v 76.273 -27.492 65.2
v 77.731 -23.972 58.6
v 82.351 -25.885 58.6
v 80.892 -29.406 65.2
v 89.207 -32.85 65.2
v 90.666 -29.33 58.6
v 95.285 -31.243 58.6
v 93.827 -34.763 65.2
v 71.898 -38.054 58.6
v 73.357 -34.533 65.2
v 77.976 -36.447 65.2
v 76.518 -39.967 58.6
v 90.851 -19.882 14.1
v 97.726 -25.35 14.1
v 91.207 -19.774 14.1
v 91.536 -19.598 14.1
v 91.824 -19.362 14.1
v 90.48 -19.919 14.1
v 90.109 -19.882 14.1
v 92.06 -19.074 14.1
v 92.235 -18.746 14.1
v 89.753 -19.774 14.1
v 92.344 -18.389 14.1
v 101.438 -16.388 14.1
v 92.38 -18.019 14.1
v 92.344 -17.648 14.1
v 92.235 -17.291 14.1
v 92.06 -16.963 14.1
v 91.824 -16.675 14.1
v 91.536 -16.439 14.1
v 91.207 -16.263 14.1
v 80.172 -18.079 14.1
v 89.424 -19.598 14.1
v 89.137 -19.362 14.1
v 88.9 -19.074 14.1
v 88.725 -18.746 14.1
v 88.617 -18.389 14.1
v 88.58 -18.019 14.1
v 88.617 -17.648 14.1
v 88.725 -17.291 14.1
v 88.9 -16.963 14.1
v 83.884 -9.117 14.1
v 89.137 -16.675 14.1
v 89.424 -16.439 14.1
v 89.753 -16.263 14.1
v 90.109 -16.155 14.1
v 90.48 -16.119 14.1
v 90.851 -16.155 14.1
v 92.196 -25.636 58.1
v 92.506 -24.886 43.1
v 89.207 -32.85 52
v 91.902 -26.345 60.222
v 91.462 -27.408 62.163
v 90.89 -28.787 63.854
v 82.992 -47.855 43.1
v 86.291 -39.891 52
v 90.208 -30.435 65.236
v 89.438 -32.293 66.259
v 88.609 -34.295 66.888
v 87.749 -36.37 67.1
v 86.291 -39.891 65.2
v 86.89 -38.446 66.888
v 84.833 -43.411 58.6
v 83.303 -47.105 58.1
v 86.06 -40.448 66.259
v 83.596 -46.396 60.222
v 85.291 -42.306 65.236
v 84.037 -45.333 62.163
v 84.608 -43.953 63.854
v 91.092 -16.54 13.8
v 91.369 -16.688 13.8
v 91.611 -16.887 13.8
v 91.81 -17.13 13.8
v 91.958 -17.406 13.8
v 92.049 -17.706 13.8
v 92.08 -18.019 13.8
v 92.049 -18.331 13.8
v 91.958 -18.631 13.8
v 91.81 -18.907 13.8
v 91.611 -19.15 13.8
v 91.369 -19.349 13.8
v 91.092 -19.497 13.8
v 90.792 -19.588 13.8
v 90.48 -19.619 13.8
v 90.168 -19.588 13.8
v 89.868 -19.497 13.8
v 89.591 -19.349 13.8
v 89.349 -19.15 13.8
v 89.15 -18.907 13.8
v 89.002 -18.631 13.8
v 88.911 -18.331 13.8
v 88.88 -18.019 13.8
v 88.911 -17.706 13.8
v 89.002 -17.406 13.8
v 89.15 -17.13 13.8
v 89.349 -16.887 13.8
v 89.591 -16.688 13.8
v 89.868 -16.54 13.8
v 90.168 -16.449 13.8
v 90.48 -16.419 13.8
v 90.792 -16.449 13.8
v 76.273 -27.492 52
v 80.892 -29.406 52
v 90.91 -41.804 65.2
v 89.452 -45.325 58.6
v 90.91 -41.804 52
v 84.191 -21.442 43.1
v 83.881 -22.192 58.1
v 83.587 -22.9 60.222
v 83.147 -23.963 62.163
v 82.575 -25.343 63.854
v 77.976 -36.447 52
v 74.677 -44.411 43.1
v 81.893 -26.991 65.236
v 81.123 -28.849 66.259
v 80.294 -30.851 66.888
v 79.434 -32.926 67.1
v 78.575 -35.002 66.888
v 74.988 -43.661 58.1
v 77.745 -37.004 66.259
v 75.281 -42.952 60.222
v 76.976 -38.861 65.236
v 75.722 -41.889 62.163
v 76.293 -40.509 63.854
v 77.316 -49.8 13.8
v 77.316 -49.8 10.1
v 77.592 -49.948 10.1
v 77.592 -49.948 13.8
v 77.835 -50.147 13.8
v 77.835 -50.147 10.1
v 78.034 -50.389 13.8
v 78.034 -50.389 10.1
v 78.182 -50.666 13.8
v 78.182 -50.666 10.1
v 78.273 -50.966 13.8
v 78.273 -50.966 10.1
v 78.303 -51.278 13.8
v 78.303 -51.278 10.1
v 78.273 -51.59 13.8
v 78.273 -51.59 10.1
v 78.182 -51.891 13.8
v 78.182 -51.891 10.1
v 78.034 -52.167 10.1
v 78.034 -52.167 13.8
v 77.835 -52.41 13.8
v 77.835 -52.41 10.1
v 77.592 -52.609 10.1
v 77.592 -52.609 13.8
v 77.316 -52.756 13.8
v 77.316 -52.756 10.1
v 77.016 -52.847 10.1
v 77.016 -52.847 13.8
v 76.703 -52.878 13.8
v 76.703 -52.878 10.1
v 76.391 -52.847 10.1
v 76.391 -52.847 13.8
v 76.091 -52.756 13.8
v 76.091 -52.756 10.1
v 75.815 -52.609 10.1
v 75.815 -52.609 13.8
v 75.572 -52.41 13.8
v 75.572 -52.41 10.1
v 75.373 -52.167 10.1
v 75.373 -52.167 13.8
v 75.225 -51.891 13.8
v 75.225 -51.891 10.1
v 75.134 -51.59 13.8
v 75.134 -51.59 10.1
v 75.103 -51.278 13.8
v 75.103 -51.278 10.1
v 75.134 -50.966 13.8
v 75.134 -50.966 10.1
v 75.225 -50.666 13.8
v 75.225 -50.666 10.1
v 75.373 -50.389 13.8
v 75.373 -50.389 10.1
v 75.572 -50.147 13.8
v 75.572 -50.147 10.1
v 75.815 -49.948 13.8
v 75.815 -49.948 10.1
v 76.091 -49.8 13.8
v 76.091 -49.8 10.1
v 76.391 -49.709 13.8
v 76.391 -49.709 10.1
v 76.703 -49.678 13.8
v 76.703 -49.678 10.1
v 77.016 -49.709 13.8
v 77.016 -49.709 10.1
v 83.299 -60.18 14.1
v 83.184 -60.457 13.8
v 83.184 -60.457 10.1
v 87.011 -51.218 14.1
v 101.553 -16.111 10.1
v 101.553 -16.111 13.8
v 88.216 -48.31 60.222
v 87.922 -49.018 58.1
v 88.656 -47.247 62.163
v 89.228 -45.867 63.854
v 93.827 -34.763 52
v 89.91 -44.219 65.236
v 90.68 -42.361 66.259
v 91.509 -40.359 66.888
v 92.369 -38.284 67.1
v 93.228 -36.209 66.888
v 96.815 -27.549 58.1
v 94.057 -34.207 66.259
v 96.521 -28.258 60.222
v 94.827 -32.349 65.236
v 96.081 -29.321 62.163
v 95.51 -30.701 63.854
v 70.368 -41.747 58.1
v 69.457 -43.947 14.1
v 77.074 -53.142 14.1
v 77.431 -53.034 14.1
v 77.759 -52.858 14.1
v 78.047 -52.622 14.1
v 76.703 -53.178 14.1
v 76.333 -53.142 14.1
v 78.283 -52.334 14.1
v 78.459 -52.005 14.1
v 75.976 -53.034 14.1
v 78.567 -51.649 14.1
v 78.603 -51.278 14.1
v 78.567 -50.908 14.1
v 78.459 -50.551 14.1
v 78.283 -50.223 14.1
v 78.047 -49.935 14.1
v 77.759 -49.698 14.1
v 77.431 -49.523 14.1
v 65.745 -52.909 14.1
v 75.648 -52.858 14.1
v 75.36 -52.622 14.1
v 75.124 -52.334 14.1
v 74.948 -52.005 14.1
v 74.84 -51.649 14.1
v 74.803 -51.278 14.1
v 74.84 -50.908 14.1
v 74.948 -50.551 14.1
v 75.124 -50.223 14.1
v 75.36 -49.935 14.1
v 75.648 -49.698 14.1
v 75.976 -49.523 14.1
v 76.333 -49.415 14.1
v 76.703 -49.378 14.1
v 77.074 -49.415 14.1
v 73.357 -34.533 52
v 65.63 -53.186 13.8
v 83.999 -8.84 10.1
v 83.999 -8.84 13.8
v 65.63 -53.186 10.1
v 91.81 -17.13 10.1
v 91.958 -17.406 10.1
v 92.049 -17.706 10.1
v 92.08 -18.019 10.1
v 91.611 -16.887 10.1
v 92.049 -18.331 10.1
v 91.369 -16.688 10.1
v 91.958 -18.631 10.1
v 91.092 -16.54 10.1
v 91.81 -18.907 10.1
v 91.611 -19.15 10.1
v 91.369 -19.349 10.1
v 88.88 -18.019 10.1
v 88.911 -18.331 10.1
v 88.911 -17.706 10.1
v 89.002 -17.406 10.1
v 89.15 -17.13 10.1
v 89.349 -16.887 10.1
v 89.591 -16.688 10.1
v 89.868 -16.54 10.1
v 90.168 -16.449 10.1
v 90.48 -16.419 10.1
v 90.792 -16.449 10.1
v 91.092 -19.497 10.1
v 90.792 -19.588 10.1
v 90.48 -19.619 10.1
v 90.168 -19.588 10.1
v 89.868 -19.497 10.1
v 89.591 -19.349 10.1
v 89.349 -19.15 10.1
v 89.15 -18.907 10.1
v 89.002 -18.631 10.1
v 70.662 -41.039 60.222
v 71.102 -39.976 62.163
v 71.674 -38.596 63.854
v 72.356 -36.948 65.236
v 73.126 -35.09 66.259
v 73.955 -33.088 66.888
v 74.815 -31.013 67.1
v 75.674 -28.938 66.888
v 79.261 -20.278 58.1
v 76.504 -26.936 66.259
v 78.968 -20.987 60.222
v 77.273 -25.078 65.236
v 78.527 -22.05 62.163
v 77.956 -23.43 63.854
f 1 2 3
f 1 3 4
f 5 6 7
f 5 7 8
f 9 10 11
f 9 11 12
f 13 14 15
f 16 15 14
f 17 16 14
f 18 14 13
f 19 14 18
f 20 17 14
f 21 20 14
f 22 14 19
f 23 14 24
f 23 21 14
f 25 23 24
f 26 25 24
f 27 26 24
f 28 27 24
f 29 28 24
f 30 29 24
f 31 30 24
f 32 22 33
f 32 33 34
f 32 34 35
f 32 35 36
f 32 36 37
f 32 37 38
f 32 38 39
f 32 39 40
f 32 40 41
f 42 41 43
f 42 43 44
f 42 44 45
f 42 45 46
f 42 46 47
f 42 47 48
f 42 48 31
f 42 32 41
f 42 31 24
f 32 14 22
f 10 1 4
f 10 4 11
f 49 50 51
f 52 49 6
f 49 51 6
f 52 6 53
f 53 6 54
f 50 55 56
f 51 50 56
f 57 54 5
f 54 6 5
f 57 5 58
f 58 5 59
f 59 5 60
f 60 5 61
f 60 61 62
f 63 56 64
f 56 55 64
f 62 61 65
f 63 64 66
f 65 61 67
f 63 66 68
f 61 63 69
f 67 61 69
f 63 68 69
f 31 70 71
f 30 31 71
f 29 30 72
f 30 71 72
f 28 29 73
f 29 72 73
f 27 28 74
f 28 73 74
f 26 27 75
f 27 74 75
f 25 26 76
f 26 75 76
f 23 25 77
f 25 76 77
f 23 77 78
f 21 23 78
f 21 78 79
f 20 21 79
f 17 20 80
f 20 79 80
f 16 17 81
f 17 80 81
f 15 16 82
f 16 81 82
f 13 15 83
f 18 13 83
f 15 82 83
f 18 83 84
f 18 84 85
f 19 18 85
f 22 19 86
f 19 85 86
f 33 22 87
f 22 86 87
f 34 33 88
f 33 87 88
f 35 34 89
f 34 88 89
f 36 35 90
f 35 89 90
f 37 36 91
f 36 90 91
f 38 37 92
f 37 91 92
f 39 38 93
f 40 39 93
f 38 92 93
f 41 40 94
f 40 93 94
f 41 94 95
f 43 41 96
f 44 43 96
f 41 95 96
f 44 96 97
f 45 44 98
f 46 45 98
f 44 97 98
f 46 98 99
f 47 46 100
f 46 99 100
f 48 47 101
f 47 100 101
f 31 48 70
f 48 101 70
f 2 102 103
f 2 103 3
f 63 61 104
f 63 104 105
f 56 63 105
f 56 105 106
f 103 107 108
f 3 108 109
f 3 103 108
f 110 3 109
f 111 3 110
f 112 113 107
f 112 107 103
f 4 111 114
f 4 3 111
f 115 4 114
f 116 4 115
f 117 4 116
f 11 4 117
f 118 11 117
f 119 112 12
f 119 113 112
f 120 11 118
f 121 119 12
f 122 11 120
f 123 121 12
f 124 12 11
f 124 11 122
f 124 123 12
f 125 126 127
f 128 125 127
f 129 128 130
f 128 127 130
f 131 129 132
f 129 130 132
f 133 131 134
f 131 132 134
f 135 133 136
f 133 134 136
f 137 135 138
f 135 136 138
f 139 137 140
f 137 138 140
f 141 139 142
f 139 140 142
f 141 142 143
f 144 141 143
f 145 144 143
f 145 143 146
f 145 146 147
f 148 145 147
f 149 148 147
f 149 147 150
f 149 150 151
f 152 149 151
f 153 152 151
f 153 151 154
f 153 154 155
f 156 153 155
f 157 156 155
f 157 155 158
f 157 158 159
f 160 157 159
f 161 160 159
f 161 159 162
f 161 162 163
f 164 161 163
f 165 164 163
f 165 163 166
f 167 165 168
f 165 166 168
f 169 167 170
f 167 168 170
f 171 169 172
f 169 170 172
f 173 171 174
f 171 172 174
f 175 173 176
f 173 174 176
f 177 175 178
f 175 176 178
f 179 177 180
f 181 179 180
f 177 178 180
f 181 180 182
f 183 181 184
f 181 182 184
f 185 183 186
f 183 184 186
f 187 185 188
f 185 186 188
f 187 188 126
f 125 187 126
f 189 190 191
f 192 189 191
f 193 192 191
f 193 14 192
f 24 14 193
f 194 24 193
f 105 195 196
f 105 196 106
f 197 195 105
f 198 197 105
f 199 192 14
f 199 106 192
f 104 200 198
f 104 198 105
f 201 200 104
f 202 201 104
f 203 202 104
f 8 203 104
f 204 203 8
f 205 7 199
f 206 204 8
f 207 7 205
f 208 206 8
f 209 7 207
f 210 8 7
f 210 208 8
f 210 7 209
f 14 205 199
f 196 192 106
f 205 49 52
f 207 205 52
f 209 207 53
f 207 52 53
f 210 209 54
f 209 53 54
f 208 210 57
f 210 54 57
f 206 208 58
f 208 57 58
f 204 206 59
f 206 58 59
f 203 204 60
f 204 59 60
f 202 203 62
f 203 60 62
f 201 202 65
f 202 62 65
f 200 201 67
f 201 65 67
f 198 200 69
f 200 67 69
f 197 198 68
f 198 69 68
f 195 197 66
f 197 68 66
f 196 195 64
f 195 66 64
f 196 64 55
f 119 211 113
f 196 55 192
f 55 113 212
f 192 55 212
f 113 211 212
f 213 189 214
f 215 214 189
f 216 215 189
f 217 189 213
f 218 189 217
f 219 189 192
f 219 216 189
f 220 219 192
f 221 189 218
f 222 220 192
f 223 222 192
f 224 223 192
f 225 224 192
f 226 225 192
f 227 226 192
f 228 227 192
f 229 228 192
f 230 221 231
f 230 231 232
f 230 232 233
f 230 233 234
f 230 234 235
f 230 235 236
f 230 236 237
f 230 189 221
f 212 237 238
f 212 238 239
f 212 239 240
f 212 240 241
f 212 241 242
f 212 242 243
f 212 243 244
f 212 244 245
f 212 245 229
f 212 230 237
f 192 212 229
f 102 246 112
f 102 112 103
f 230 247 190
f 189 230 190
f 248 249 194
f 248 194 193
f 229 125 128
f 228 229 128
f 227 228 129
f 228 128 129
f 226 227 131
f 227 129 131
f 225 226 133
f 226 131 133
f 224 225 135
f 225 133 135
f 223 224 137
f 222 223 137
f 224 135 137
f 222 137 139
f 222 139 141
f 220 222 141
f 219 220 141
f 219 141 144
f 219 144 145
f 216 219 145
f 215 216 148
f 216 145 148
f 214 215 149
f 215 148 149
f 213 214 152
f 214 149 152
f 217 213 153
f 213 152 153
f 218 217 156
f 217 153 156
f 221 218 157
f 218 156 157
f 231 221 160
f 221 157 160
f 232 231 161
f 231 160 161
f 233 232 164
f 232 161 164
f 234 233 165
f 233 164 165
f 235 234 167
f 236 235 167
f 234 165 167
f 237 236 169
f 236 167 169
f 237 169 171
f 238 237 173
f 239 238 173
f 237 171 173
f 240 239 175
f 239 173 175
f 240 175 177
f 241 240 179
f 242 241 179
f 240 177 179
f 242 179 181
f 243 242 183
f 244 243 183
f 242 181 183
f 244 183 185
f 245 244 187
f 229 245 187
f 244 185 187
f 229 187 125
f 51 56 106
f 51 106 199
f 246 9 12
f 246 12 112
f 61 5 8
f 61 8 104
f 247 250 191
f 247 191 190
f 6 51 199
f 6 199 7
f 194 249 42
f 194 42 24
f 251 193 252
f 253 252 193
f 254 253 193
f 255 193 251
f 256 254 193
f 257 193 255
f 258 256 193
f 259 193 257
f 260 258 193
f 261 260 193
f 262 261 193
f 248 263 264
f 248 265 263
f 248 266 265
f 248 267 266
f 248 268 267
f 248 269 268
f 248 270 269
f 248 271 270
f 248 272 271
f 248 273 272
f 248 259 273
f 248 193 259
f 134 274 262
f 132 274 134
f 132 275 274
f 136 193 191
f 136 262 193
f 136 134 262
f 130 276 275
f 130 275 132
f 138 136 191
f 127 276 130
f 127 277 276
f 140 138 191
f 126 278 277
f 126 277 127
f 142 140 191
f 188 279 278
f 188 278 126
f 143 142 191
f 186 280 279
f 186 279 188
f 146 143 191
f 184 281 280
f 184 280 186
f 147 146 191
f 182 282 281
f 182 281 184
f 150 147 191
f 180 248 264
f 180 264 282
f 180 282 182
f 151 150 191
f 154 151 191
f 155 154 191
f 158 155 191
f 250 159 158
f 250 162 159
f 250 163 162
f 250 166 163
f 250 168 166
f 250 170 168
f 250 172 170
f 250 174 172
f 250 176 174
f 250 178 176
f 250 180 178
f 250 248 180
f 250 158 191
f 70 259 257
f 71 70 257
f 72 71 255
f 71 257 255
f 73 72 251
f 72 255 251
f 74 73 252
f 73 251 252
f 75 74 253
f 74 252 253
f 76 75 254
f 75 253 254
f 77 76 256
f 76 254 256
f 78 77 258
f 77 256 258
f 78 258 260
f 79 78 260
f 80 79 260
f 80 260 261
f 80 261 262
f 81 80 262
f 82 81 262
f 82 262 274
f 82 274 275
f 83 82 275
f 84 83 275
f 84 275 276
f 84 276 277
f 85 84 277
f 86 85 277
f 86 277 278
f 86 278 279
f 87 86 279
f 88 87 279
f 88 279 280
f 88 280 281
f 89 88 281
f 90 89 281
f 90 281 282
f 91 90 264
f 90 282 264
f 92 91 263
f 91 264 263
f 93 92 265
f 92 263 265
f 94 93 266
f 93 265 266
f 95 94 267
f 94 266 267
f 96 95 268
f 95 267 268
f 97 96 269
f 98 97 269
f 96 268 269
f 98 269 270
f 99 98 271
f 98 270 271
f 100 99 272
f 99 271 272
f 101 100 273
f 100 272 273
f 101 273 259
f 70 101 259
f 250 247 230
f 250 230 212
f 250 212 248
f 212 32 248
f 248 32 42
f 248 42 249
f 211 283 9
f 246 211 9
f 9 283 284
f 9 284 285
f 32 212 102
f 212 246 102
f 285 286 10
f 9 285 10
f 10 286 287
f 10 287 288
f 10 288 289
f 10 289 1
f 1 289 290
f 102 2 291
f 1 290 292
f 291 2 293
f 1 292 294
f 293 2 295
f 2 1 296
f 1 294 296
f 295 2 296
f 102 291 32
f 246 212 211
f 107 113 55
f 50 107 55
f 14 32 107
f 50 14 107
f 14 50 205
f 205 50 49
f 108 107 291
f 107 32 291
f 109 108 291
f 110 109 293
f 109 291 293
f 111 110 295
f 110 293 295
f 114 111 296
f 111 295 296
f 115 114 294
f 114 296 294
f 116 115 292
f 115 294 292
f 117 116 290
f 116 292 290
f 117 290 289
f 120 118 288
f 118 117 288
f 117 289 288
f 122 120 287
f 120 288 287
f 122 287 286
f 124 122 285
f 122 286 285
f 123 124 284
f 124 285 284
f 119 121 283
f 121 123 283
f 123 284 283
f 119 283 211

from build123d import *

# Parameters (mm, degrees)
PAD030_DEPTH            = 19
SKETCH090_W             = 9
SKETCH090_H             = 27
POCKET054_DEPTH         = 15
SKETCH089_R             = 1.6
POCKET053_DEPTH         = 5
CHAMFER010_SIZE         = 0.3
BODY020_PLACEMENT_ANGLE = 22.5


with BuildPart() as part:
    # Sketch088 → Pad030 (new body)
    with BuildSketch(Plane.YZ):
        with BuildLine():
            ThreePointArc((11.6189500386, 3), (0, 12), (-11.6189500386, 3))
            Line((-11.6189500386, 3), (-14, -41))
            Line((-24, -41), (-14, -41))
            Line((-24, -45), (-24, -41))
            Line((24, -45), (-24, -45))
            Line((24, -41), (24, -45))
            Line((14, -41), (24, -41))
            Line((14, -41), (11.6189500386, 3))
        make_face()
        Polygon((7.6210235533, 3.5), (3.8105117767, 10.1), (-3.8105117767, 10.1), (-7.6210235533, 3.5), (-3.8105117767, -3.1), (3.8105117767, -3.1), align=None, mode=Mode.SUBTRACT)
    extrude(amount=PAD030_DEPTH)

    # Sketch090 → Pocket054 (cut, symmetric)
    with BuildSketch(Plane.XZ):
        with Locations((9.5, 1.5)):
            Rectangle(SKETCH090_W, SKETCH090_H)
    extrude(amount=POCKET054_DEPTH, both=True, mode=Mode.SUBTRACT)

    # Sketch089 (on Face8 of Pocket054) → Pocket053 (cut)
    with BuildSketch(Plane.YX.offset(45)):
        with Locations((-18, 9.5)):
            Circle(SKETCH089_R)
        with Locations((18, 9.5)):
            Circle(SKETCH089_R)
    extrude(amount=-POCKET053_DEPTH, mode=Mode.SUBTRACT)

    # Chamfer010
    chamfer010_edges = [part.edges().sort_by_distance(p)[0] for p in [
        (9.5, 16.4, -41),
        (9.5, -19.6, -41),
        (9.5, -24, -41),
        (9.5, 24, -41),
    ]]
    chamfer(chamfer010_edges, length=CHAMFER010_SIZE)


with BuildPart() as part_1:
    # Body020 placement: moved
    add(part.part.moved(Location((74.8148666983, -31.0129027885, 55.1))).rotate(Axis((74.8148666983, -31.0129027885, 55.1), (0, 0, -1)), BODY020_PLACEMENT_ANGLE))


solid = part_1.part
